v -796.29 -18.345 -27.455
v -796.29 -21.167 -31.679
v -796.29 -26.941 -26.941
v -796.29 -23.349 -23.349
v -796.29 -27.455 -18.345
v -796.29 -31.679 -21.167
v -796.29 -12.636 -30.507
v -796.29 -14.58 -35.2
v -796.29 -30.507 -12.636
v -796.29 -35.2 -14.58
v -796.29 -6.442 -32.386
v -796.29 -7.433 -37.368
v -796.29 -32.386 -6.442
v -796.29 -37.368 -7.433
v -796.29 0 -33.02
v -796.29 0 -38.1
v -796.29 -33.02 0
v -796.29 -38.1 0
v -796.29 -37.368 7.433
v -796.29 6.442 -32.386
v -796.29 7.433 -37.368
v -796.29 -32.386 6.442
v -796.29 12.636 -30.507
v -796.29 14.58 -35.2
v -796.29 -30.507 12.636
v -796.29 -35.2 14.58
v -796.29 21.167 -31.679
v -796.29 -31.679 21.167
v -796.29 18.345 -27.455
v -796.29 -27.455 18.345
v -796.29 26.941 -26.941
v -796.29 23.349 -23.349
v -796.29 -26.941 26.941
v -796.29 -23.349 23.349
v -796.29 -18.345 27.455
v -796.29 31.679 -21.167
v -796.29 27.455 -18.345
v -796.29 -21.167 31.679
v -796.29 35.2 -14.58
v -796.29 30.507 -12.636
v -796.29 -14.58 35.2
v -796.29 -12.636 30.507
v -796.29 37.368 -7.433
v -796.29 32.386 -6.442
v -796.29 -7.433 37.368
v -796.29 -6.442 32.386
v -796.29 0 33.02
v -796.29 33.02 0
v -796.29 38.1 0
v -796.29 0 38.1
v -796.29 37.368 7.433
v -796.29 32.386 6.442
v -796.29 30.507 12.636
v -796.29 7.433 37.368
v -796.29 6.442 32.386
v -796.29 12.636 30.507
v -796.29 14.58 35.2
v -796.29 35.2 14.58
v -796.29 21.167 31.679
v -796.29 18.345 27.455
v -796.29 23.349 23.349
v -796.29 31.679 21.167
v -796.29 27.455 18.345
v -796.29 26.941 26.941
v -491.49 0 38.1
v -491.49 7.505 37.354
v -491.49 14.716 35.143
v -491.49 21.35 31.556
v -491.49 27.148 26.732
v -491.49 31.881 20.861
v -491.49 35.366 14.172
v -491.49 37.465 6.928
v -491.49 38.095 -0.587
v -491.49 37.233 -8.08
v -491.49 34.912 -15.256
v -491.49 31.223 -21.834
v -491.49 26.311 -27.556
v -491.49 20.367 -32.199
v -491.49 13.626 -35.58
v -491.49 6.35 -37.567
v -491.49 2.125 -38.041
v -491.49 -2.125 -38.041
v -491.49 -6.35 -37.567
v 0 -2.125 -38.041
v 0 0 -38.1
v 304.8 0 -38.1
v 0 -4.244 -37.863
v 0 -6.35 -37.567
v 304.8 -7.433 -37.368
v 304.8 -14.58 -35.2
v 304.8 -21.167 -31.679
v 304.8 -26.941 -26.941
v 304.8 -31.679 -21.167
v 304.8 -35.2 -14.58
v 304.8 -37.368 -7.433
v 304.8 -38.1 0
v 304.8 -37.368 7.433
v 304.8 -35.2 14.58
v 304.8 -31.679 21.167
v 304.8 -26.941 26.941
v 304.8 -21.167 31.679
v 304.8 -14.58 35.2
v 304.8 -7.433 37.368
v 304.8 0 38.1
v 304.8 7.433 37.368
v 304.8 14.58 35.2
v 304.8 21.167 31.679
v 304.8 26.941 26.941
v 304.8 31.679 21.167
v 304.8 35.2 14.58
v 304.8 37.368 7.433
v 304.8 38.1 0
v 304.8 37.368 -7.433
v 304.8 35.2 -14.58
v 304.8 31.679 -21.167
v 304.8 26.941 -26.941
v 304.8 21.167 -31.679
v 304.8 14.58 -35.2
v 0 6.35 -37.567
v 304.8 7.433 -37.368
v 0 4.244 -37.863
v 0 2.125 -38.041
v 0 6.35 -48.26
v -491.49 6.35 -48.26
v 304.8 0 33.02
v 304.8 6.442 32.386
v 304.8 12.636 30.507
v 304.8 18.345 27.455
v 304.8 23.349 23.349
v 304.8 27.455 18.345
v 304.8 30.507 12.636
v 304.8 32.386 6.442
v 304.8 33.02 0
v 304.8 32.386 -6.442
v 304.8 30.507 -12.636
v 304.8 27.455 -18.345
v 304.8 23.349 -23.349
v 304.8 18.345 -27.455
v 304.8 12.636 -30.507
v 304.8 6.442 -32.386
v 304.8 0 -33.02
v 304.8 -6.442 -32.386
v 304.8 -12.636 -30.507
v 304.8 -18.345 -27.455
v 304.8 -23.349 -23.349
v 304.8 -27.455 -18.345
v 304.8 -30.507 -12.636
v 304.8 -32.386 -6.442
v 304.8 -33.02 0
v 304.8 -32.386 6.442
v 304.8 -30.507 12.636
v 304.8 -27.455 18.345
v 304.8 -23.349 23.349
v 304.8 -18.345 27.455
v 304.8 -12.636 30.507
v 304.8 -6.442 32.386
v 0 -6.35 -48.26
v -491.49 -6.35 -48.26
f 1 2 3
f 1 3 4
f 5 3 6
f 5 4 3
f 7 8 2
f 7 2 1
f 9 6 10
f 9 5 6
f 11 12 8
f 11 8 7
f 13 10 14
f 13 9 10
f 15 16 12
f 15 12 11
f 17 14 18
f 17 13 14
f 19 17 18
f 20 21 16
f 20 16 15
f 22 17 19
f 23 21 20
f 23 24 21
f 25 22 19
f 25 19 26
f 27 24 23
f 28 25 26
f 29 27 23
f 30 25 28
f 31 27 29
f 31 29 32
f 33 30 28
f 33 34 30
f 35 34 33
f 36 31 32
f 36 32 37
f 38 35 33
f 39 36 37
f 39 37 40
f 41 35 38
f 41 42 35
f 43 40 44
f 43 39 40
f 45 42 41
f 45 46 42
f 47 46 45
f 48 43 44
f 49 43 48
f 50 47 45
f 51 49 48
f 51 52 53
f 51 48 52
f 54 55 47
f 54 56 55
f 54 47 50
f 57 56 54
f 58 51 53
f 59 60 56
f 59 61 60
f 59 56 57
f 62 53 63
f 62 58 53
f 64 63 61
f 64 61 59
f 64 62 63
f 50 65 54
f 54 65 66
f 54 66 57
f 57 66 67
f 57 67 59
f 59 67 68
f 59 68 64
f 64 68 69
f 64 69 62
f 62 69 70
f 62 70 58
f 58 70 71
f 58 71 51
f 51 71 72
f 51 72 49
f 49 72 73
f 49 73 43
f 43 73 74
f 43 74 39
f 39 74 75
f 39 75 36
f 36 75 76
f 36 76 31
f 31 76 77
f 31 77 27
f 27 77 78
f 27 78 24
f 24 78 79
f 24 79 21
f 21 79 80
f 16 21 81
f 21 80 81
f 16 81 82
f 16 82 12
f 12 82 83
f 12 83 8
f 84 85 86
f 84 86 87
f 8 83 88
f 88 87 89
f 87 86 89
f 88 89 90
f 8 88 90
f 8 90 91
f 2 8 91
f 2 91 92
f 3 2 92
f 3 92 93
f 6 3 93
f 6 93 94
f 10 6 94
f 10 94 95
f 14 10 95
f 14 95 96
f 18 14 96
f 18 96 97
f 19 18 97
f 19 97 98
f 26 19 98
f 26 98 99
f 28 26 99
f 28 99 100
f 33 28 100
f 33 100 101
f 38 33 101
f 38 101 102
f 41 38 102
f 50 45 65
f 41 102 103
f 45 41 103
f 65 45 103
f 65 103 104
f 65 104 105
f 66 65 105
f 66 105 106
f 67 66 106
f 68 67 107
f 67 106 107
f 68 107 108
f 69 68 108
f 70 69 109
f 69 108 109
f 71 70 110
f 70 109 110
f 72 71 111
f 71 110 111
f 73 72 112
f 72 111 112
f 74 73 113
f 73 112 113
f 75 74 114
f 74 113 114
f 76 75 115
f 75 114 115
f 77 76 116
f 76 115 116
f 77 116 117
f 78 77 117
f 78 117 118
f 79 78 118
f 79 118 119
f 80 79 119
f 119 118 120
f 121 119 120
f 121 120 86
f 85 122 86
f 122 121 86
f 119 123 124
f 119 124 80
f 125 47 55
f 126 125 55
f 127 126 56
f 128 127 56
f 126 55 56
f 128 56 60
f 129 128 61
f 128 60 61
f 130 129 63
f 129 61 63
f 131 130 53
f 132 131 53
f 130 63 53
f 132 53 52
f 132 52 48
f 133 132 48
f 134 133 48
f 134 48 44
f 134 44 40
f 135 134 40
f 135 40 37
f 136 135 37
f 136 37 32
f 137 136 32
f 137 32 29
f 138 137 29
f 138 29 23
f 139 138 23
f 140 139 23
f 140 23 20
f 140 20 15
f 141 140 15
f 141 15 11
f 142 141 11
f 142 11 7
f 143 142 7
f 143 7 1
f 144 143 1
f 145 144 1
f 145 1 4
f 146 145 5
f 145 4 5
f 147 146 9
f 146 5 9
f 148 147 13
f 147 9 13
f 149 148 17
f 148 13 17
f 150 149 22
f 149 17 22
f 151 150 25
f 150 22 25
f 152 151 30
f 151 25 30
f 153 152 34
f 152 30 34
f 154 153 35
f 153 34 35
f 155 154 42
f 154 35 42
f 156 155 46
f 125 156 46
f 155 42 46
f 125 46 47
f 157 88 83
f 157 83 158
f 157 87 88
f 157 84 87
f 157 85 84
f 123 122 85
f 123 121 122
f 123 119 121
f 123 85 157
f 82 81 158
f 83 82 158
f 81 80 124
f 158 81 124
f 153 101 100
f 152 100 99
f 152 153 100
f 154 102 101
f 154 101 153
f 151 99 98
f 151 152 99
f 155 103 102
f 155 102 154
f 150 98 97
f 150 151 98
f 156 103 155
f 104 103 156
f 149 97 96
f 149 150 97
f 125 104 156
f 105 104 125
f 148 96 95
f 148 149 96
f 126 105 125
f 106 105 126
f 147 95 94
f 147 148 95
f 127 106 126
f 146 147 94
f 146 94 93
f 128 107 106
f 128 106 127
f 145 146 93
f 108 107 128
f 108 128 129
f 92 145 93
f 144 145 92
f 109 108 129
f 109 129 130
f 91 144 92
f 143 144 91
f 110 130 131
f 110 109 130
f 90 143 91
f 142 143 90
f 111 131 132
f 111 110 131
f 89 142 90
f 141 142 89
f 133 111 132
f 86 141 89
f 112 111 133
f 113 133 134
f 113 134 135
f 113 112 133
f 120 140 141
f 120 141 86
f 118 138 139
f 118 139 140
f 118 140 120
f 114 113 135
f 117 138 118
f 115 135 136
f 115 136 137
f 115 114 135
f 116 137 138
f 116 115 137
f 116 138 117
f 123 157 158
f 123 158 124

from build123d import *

# Parameters (mm, degrees)
BOSS_EXTRUDE1_DEPTH = 491.49
SKETCH2_R           = 38.1
BOSS_EXTRUDE2_DEPTH = 304.8
SKETCH3_R           = 38.1
BOSS_EXTRUDE3_DEPTH = 304.8
SKETCH4_R           = 33.02
CUT_EXTRUDE1_DEPTH  = 1102.09


with BuildPart() as part:
    # Sketch1 → Boss-Extrude1 (new body)
    with BuildSketch(Plane(origin=(0, 0, 0), x_dir=(0, 0, -1), z_dir=(1, 0, 0))):
        with BuildLine():
            Line((27.94, 6.35), (27.94, -6.35))
            Line((27.94, -6.35), (37.567106623, -6.35))
            ThreePointArc((37.567106623, -6.35), (37.966542918, -3.186160517), (38.1, 0))
            ThreePointArc((38.1, 0), (37.966542918, 3.186160517), (37.567106623, 6.35))
            Line((37.567106623, 6.35), (27.94, 6.35))
        make_face()
        with BuildLine():
            Line((37.567106623, -6.35), (27.94, -6.35))
            Line((27.94, -6.35), (27.94, 6.35))
            Line((27.94, 6.35), (37.567106623, 6.35))
            ThreePointArc((37.567106623, 6.35), (-38.1, 0), (37.567106623, -6.35))
        make_face()
        with BuildLine():
            ThreePointArc((38.1, 0), (37.966542918, -3.186160517), (37.567106623, -6.35))
            Line((37.567106623, -6.35), (48.26, -6.35))
            Line((48.26, -6.35), (48.26, 6.35))
            Line((48.26, 6.35), (37.567106623, 6.35))
            ThreePointArc((37.567106623, 6.35), (37.966542918, 3.186160517), (38.1, 0))
        make_face()
    extrude(amount=-BOSS_EXTRUDE1_DEPTH)

    # Sketch2 → Boss-Extrude2 (add)
    with BuildSketch(Plane(origin=(0, 0, 0), x_dir=(0, 0, -1), z_dir=(1, 0, 0))):
        Circle(SKETCH2_R)
    extrude(amount=BOSS_EXTRUDE2_DEPTH)

    # Sketch3 → Boss-Extrude3 (add)
    with BuildSketch(Plane.ZY.offset(491.49)):
        Circle(SKETCH3_R)
    extrude(amount=BOSS_EXTRUDE3_DEPTH)

    # Sketch4 → Cut-Extrude1 (cut, through all)
    with BuildSketch(Plane.ZY.offset(796.29)):
        Circle(SKETCH4_R)
    extrude(amount=-CUT_EXTRUDE1_DEPTH, mode=Mode.SUBTRACT)


solid = part.part
